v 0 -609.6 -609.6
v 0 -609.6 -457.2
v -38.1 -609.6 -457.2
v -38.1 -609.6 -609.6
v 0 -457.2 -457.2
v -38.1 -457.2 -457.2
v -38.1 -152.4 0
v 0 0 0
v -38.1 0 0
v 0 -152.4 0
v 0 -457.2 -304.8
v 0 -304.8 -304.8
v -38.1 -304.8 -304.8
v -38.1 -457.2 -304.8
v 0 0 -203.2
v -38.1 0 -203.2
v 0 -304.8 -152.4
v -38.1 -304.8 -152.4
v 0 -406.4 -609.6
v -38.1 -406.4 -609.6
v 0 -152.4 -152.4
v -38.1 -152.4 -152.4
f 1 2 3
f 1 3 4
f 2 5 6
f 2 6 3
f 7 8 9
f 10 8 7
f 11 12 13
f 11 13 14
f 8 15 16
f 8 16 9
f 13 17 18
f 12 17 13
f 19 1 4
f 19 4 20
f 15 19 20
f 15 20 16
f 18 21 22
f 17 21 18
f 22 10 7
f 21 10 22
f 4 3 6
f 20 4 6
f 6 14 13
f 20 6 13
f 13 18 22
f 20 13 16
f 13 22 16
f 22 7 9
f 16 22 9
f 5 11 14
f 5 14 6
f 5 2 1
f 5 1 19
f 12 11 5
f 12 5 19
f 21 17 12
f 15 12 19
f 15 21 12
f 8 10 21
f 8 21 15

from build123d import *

# Parameters (mm, degrees)
F1_DEPTH = 38.1


with BuildPart() as f1:
    # F0 (on Right) → F1 (new body)
    with BuildSketch(Plane.YZ):
        Polygon((-457.2, -304.8), (-457.2, -457.2), (-609.6, -457.2), (-609.6, -609.6), (-406.4, -609.6), (0, -203.2), (0, 0), (-152.4, 0), (-152.4, -152.4), (-304.8, -152.4), (-304.8, -304.8), align=None)
    extrude(amount=-F1_DEPTH)


solid = f1.part
